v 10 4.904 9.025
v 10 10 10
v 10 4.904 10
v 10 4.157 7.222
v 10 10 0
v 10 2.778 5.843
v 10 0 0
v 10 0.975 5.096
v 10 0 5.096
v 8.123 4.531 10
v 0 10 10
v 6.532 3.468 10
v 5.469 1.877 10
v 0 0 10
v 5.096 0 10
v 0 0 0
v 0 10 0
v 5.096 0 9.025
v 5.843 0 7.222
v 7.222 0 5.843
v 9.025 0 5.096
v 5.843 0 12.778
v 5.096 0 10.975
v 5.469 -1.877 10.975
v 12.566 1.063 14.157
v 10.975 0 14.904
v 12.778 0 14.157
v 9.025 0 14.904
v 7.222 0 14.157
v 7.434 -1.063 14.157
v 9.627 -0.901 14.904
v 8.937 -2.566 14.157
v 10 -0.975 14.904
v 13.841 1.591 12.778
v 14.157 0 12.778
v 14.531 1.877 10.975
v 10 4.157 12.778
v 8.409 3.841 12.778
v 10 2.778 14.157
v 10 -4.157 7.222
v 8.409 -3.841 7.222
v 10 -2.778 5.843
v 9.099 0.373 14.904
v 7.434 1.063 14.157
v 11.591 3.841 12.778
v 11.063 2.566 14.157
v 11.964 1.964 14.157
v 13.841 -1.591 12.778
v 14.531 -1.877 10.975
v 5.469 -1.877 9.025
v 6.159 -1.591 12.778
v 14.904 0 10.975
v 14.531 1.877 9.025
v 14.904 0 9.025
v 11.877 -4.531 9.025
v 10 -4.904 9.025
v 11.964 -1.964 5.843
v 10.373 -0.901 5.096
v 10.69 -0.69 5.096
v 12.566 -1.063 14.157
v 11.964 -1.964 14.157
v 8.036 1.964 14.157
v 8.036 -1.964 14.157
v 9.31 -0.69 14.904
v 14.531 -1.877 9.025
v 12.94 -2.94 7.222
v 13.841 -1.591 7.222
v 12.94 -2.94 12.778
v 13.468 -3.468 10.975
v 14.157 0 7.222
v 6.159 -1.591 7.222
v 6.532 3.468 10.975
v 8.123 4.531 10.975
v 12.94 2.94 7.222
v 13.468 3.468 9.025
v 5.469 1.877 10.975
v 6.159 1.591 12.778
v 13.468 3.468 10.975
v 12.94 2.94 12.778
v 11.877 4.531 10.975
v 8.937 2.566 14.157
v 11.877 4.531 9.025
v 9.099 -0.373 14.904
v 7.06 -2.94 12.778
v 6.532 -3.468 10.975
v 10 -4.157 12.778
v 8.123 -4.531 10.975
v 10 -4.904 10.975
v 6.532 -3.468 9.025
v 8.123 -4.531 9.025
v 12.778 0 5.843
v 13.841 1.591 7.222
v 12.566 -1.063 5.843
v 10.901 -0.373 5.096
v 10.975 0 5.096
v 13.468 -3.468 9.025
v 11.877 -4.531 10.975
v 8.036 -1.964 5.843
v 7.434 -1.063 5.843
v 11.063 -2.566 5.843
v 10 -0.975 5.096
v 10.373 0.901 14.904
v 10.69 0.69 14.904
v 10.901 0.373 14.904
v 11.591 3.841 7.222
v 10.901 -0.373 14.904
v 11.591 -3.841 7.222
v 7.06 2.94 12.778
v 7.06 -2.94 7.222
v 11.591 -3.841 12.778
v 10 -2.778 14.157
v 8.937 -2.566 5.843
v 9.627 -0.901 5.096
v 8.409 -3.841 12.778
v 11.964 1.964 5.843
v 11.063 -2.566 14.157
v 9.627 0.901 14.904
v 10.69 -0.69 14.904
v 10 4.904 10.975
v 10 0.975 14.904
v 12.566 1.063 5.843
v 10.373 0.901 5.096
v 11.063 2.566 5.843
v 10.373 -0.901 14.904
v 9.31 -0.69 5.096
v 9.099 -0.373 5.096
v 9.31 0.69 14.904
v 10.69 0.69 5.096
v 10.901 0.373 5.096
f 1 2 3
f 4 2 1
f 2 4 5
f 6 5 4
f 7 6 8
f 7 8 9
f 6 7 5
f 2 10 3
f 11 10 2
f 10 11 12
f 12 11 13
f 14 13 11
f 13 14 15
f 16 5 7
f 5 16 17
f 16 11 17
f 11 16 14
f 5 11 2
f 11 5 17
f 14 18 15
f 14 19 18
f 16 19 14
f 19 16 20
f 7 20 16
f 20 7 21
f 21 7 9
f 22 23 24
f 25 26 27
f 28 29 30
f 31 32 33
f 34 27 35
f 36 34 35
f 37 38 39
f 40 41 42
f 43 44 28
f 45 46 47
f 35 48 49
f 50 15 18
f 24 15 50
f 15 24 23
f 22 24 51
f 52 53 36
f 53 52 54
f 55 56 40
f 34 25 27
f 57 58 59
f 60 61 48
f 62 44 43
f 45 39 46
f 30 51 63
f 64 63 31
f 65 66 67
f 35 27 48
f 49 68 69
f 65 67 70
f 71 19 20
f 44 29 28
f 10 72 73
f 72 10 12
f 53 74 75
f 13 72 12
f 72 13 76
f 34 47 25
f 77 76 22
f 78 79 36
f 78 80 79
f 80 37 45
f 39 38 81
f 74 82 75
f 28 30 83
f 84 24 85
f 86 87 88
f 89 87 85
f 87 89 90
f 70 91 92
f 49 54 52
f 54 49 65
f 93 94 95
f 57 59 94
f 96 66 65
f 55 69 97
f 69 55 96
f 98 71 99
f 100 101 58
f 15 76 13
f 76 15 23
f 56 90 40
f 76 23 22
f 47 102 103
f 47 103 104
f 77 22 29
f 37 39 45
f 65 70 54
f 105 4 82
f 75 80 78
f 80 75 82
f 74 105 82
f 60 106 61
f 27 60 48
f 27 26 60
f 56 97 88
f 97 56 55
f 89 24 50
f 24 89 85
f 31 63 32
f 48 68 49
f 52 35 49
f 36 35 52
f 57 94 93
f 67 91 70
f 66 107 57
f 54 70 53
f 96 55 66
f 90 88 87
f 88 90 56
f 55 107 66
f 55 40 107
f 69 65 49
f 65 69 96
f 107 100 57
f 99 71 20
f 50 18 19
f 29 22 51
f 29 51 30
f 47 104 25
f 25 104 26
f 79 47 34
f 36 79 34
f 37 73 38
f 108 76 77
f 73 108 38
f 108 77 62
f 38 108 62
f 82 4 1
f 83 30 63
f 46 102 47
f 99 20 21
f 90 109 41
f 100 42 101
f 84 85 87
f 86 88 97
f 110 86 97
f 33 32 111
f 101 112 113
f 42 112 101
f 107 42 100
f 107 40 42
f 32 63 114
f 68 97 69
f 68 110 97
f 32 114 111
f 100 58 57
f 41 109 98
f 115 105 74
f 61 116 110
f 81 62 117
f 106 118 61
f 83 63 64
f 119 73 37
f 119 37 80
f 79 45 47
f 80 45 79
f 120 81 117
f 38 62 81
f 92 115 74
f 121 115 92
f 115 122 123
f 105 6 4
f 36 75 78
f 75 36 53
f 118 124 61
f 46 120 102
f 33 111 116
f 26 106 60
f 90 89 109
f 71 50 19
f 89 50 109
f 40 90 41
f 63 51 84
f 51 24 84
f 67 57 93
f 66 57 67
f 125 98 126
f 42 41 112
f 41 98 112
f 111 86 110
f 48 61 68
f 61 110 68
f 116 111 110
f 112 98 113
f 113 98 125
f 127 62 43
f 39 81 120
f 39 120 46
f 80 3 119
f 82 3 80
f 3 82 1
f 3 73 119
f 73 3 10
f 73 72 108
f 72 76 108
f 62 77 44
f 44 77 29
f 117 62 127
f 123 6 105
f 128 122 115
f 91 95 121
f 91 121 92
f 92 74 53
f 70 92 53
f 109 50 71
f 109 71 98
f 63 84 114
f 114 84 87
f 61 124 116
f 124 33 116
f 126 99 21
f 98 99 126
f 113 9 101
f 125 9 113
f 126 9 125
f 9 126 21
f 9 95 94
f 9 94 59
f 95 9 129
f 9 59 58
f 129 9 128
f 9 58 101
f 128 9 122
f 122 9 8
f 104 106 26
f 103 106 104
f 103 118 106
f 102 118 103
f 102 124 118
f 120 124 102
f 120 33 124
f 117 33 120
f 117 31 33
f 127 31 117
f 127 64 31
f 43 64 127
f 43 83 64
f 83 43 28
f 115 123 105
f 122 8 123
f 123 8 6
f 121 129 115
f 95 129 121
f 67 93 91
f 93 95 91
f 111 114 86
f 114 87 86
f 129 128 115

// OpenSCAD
union()
{
    color([1,0,0])
    cube ([10,10,10]);

    color([0,0,1])
    translate ([10,0,10])
    sphere (r=5);
}
